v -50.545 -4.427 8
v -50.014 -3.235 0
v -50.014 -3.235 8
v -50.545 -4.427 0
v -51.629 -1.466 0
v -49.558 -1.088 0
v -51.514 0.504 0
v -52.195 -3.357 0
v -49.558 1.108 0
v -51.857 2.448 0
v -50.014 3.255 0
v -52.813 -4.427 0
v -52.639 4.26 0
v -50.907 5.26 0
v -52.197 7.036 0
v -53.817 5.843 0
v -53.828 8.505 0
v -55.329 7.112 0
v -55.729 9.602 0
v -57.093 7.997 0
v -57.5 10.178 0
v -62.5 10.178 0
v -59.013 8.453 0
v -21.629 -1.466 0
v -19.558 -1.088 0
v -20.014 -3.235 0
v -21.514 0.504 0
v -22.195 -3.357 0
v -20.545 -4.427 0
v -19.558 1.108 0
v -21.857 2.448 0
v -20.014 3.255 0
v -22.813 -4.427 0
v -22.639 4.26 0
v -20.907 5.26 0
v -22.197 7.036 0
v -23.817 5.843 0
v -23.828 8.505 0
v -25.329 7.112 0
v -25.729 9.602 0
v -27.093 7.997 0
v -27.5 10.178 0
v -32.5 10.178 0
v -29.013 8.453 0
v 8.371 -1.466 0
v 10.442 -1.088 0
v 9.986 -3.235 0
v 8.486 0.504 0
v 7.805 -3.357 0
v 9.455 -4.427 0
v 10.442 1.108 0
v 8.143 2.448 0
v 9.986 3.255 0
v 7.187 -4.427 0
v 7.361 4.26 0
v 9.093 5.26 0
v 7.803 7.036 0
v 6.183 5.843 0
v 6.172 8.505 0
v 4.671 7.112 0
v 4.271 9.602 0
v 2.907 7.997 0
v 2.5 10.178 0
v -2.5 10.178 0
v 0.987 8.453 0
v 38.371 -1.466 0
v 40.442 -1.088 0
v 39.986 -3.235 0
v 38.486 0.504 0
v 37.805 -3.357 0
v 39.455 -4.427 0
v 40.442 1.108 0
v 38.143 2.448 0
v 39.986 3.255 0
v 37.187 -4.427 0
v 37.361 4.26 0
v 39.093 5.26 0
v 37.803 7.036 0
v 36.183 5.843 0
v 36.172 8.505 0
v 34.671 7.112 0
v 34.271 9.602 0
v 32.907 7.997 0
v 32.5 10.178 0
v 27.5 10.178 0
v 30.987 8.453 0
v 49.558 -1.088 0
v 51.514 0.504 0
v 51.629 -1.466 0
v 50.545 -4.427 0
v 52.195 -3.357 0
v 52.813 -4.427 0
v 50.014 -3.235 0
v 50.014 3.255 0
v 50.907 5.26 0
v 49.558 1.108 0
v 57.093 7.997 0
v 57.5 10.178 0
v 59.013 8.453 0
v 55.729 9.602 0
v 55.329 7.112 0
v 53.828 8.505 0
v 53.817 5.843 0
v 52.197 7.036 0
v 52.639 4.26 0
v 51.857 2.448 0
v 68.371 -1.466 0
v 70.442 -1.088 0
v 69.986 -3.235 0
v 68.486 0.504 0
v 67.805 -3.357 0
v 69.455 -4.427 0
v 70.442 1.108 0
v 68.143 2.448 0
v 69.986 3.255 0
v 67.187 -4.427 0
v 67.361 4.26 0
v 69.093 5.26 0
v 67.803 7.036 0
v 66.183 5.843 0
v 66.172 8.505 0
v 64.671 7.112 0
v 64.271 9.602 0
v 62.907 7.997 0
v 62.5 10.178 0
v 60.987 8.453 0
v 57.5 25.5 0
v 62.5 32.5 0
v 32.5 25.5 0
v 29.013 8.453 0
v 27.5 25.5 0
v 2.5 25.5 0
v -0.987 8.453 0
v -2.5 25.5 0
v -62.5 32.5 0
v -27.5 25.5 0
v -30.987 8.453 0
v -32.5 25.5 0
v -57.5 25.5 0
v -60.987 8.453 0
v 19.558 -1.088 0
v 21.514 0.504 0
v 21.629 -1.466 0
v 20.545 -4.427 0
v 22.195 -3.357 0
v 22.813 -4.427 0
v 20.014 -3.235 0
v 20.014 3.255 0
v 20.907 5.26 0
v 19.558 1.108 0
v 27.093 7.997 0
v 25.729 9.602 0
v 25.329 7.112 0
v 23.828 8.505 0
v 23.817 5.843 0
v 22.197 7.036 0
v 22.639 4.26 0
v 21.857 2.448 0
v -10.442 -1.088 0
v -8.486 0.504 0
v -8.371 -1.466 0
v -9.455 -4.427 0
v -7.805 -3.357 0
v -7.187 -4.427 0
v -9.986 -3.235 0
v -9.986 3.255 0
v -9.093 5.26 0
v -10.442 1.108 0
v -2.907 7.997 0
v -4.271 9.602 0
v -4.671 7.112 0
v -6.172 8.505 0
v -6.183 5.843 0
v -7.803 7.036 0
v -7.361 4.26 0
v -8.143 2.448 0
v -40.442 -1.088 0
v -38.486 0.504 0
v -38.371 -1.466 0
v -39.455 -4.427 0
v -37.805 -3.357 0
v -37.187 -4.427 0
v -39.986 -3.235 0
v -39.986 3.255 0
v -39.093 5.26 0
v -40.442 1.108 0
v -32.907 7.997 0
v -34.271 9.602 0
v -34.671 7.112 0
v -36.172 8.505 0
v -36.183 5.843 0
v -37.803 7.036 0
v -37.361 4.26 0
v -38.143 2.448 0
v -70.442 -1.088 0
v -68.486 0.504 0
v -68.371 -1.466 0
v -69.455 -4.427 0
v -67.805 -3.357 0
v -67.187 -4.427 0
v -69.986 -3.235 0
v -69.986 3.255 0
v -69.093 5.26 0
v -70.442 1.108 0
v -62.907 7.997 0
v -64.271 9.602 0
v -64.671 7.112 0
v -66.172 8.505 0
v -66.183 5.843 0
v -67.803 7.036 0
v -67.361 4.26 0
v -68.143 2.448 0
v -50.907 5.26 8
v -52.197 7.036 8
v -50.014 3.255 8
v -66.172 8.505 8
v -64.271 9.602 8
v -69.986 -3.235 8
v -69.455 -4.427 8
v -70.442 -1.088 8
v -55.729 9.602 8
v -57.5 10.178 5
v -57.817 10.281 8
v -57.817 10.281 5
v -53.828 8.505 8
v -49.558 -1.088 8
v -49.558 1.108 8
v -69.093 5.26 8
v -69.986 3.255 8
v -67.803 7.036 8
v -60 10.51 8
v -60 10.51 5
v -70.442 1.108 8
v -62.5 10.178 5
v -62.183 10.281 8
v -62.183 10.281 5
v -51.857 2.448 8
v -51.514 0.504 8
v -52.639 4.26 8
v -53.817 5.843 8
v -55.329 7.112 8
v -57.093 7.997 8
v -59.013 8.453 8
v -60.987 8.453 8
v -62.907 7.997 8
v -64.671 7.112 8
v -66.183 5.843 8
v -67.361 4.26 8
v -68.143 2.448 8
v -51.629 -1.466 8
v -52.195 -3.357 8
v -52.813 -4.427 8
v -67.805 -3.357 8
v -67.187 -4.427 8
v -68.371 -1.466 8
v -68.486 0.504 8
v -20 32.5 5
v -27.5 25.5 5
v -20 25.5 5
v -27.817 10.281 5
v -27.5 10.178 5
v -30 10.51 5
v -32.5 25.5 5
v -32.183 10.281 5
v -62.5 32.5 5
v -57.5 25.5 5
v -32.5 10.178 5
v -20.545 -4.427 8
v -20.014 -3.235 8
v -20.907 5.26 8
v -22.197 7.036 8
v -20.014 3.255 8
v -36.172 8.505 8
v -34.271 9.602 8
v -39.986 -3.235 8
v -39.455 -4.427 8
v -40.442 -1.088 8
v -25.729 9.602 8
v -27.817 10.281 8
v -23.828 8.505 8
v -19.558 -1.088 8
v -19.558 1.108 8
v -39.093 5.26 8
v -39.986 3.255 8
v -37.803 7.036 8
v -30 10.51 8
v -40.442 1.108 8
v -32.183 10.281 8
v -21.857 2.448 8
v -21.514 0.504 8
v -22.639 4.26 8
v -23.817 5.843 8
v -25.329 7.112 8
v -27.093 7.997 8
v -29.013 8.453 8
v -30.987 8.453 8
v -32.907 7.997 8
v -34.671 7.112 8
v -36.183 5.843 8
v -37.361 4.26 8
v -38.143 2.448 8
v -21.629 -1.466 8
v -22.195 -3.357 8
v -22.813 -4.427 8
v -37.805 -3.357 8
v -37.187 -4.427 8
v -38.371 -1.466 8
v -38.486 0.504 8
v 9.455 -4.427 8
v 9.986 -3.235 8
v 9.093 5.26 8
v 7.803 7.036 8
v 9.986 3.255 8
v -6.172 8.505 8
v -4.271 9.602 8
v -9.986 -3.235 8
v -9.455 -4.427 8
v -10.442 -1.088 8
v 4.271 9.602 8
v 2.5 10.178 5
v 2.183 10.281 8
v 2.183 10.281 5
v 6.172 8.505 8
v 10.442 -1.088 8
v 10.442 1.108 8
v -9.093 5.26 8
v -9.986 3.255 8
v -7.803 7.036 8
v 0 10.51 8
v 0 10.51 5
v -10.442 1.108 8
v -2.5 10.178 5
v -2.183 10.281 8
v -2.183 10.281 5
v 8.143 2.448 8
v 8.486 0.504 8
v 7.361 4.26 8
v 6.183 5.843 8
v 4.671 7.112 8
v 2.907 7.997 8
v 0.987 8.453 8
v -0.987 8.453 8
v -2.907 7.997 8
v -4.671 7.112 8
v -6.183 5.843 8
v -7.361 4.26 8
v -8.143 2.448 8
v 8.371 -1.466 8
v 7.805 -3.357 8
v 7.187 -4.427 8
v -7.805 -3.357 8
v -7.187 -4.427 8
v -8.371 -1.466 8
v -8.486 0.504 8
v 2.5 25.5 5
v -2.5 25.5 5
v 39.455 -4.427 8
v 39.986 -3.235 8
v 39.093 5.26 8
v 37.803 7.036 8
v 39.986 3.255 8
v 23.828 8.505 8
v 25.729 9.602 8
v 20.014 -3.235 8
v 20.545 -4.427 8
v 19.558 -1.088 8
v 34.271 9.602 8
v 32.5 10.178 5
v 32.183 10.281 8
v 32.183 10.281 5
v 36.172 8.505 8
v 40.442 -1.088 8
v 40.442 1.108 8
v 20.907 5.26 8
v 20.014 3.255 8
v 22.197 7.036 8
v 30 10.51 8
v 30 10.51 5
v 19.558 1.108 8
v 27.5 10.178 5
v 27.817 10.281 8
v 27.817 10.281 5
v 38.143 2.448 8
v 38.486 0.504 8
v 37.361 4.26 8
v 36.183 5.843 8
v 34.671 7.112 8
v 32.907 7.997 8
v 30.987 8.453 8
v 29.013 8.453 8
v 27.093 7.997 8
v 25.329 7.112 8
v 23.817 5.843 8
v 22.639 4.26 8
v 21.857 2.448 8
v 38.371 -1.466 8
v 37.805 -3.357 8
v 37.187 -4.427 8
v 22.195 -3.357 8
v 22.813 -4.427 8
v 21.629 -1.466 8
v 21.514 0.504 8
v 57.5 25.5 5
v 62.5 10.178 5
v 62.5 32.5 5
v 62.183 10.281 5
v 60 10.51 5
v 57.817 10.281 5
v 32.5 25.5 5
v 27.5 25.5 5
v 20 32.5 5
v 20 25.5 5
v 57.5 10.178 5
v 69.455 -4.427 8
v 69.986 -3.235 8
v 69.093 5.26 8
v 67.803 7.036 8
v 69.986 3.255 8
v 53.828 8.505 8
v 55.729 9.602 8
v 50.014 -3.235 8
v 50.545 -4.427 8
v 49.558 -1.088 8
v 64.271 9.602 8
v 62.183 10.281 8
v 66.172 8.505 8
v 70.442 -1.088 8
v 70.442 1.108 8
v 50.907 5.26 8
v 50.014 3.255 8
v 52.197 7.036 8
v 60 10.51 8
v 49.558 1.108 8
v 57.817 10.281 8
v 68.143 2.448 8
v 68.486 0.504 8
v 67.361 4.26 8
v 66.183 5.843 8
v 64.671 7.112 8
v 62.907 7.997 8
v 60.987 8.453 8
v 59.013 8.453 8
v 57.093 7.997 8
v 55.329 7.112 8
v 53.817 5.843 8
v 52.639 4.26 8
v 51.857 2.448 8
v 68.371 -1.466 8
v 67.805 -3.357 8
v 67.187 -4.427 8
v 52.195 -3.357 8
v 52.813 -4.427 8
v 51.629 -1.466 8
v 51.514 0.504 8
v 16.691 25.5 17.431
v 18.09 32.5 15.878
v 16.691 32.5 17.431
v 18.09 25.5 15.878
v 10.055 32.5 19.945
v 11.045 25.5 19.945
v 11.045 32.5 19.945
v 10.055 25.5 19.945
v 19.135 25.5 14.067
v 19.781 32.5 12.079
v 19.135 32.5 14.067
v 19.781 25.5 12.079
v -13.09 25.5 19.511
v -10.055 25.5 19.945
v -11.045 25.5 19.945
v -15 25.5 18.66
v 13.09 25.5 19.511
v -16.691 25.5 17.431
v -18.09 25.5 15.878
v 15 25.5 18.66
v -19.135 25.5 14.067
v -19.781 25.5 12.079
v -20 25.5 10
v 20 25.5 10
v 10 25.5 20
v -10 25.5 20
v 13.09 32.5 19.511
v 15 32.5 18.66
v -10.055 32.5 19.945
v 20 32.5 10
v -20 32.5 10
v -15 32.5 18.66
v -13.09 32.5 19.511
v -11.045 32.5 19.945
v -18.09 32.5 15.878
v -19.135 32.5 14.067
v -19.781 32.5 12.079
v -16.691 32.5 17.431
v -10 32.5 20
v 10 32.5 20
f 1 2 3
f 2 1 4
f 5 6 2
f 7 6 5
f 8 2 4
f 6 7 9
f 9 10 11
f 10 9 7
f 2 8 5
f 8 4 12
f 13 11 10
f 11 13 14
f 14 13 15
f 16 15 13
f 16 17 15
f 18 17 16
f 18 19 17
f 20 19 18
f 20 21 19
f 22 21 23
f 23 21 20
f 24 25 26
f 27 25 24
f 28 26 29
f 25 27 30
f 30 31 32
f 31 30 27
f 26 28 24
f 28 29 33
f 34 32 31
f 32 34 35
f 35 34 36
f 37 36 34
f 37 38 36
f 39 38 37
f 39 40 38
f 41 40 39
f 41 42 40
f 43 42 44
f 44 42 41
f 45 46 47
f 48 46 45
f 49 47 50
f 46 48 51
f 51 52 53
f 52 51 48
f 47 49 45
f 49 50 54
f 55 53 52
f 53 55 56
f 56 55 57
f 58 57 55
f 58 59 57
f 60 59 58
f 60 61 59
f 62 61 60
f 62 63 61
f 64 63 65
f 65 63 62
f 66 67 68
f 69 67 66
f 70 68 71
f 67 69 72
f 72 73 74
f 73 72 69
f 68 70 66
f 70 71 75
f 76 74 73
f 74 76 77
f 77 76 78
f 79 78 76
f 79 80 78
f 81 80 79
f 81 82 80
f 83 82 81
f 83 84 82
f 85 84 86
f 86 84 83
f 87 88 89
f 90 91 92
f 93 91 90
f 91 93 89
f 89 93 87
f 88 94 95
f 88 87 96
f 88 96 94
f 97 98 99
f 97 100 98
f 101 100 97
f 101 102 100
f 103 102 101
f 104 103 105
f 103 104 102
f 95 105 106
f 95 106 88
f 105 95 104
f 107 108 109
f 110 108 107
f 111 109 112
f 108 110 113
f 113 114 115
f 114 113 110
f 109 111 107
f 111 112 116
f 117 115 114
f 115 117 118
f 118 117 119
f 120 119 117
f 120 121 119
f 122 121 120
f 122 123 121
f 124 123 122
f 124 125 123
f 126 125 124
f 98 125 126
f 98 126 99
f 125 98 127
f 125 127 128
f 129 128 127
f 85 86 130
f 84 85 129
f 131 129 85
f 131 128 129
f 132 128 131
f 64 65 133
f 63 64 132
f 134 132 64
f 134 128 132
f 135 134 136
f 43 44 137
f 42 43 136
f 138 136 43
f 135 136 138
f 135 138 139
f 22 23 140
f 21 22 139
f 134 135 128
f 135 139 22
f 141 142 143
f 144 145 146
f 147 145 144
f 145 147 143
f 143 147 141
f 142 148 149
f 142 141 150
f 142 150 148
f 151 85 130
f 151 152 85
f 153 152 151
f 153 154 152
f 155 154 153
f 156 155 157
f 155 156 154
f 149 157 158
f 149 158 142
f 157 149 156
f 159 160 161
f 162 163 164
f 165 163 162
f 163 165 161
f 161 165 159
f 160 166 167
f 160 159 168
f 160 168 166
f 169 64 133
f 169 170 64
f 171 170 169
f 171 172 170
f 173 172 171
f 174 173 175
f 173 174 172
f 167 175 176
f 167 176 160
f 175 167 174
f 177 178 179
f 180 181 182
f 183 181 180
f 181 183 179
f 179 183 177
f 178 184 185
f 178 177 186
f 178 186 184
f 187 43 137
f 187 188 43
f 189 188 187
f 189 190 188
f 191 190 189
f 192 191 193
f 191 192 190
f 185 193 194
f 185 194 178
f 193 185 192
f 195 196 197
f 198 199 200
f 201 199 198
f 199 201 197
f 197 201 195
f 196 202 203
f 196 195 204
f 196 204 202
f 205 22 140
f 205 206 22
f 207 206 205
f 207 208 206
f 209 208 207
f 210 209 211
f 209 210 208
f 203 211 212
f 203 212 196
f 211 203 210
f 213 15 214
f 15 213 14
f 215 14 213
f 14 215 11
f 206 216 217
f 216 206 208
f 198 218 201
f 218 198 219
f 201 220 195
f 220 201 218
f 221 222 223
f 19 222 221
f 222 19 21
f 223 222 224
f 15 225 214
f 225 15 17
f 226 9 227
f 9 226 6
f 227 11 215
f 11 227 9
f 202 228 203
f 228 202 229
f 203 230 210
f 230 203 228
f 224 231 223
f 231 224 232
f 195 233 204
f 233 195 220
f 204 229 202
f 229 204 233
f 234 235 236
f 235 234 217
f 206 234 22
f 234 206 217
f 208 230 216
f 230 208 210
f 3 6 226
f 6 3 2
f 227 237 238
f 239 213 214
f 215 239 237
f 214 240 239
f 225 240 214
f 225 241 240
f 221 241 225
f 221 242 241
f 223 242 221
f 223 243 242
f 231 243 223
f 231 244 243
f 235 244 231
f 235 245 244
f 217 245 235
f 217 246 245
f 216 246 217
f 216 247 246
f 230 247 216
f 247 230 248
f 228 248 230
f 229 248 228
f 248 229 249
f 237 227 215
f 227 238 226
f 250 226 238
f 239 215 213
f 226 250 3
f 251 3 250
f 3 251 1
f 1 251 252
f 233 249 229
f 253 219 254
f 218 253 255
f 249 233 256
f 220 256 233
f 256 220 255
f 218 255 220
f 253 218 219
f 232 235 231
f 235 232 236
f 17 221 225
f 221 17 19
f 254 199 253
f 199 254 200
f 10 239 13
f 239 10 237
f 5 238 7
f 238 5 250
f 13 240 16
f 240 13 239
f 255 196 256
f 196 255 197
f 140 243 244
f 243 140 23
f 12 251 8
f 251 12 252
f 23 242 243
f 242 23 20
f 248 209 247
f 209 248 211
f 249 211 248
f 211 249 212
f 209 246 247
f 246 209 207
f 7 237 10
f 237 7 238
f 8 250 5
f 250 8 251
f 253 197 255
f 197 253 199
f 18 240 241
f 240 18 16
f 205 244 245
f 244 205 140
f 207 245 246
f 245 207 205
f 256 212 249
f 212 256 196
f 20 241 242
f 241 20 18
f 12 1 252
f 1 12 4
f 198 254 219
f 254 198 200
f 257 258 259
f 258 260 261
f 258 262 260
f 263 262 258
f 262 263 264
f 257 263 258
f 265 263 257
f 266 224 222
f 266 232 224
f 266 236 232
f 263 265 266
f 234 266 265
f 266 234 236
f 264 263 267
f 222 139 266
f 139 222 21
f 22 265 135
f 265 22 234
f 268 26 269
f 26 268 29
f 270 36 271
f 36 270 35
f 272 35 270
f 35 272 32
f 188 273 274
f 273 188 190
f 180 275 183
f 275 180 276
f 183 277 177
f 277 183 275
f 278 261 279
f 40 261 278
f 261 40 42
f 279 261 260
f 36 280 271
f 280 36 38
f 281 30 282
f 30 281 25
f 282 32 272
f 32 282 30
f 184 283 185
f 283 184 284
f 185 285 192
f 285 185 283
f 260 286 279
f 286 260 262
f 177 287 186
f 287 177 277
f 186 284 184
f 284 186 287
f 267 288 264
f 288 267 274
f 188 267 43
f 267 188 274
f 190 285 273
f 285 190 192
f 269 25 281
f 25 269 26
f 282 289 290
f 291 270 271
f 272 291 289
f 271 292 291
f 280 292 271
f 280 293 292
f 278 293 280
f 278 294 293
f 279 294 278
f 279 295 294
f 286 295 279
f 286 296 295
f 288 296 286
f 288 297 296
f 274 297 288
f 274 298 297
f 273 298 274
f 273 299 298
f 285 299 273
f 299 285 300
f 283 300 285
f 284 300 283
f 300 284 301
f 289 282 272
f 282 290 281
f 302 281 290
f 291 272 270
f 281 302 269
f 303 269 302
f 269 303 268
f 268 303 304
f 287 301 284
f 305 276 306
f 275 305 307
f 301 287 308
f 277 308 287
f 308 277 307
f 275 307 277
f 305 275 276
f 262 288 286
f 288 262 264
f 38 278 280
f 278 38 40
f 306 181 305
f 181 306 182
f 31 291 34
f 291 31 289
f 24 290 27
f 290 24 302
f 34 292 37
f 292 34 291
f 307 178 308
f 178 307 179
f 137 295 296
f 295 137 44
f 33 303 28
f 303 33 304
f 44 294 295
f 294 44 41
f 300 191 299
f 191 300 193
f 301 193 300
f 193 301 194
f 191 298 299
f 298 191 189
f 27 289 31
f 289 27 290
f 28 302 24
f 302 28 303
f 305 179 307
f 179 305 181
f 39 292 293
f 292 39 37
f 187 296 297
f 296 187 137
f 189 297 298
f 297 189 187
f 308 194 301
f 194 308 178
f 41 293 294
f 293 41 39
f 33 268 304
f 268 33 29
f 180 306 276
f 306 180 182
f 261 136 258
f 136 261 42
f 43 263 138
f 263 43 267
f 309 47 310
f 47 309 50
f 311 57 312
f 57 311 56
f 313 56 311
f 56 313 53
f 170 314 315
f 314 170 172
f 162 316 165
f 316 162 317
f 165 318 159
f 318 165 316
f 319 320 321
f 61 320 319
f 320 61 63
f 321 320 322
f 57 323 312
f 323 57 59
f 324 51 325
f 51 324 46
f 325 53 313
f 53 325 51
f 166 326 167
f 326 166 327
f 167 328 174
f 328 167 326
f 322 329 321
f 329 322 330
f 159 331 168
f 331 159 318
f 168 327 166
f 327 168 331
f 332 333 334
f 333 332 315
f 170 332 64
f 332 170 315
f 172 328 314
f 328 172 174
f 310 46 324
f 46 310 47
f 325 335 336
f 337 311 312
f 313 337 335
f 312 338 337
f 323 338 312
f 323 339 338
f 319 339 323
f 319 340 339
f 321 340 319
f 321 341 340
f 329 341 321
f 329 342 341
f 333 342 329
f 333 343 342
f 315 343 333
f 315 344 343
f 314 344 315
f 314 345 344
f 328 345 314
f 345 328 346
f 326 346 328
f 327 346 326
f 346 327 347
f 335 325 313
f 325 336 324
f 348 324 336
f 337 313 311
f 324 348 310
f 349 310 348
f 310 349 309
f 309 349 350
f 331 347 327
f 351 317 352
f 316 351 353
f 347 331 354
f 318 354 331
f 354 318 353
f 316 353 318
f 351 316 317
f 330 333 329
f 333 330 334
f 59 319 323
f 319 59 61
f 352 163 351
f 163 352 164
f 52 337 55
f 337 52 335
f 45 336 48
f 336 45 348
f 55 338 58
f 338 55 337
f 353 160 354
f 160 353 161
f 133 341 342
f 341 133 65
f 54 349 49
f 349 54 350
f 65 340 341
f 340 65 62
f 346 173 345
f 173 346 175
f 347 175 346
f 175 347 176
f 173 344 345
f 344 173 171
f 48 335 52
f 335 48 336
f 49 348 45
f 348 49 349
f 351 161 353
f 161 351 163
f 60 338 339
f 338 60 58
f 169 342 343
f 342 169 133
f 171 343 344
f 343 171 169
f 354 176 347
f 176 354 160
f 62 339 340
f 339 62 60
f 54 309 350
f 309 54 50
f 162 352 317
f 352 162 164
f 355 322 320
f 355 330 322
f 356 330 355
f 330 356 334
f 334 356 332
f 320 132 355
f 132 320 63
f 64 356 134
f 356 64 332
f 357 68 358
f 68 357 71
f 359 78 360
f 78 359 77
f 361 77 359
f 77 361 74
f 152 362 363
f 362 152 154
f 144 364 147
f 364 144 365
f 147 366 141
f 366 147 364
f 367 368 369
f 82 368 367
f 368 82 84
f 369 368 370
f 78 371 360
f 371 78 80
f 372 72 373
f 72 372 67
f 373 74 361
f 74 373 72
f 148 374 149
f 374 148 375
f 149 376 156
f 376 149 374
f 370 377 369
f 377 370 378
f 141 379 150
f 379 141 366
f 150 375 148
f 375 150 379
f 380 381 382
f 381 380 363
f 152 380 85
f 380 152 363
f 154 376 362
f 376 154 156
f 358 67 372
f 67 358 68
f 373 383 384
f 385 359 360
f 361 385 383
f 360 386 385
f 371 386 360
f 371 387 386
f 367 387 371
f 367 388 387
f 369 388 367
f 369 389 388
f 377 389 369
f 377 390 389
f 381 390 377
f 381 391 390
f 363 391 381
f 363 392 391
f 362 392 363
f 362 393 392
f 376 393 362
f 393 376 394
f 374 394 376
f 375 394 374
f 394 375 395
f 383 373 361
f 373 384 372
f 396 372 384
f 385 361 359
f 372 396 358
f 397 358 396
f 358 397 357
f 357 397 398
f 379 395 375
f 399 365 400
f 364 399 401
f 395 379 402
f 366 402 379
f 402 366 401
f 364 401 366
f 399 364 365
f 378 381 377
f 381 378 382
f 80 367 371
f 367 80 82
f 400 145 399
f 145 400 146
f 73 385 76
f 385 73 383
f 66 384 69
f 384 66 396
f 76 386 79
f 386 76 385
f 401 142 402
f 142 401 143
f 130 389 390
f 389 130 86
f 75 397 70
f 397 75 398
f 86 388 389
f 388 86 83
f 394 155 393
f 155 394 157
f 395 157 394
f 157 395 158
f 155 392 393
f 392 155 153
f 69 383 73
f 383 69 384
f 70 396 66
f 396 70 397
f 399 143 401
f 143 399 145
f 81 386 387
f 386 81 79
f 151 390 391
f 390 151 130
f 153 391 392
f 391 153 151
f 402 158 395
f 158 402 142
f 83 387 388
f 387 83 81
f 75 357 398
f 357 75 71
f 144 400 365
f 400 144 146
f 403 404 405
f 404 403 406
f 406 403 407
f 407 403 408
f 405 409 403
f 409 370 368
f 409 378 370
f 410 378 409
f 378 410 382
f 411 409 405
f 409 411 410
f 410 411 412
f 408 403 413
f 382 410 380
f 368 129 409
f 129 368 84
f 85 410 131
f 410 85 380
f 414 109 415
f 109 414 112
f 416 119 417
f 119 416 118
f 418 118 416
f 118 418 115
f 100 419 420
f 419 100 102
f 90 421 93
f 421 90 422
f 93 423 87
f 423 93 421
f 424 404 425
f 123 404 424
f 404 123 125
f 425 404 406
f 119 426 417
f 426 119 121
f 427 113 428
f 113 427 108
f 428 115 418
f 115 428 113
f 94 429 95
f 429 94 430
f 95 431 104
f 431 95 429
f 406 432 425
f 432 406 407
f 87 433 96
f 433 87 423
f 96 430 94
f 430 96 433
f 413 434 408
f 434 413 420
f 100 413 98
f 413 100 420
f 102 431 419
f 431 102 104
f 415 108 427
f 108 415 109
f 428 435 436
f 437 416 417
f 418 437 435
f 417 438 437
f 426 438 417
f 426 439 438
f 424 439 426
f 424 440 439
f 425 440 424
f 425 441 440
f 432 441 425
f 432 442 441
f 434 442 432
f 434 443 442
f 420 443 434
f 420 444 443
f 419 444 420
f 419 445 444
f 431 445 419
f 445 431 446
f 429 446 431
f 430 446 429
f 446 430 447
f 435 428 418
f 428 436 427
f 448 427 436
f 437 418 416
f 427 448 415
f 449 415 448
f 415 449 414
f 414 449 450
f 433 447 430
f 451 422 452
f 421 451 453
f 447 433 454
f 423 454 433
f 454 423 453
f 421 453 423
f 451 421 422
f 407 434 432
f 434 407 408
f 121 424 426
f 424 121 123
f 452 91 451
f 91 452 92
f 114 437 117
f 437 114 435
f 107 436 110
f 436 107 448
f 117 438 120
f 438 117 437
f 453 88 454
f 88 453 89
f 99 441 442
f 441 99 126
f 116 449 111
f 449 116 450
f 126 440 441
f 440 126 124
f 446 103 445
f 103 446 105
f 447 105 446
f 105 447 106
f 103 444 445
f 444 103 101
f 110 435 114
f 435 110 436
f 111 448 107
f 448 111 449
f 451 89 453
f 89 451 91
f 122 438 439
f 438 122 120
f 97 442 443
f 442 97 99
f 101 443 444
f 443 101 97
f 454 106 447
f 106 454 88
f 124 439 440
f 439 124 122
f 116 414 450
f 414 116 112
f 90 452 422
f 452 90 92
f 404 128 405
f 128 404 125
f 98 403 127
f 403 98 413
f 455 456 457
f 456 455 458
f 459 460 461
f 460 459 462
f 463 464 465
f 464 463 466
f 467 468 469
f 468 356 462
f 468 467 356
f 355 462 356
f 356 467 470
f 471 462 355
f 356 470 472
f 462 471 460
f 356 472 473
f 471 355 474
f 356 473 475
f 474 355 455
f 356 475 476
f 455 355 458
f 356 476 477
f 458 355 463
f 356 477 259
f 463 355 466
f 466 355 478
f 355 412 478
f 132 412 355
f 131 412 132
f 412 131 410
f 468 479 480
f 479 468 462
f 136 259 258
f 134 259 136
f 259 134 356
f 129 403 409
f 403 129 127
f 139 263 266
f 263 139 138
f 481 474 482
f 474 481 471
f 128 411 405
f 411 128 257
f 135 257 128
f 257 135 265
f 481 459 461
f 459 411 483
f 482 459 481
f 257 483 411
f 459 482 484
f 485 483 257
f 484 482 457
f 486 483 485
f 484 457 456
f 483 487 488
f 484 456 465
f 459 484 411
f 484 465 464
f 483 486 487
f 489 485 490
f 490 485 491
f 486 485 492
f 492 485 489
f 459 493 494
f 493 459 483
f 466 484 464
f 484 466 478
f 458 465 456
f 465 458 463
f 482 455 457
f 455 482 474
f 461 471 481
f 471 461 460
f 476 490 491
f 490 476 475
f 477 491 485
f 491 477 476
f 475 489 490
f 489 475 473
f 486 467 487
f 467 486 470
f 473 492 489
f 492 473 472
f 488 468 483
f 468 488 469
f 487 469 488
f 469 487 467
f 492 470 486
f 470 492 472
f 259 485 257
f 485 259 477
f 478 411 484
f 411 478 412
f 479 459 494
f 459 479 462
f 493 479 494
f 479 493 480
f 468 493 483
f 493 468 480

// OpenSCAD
// [FL_INDEX: keywords="openscad, 3d_parametric, Parallel_Line_Drawing_Tool__Parametric, csg_solid" | COT="Parametric OpenSCAD design from 3DCodeverse"]
// Title: Parallel Line Drawing Tool (Parametric)

/*
 * Parallel Line Jig
 *
 * by Alex Franke (CodeCreations), Oct 2012
 * http://www.theFrankes.com
 * 
 * Licenced under Creative Commons Attribution - Non-Commercial - Share Alike 3.0 
 * 
 * INSTRUCTIONS: Choose some values in the "User-defined values" section, render, and print.
 *   It works well to hold the jig between your thumb and index finger as you pull it across 
 *   the drawing surface.  
 * 
 * THING: http://www.thingiverse.com/thing:31061
 * 
 * v1.00, Oct 3, 2012: Initial release. 
 *
 * TODO: 
 *   * Include keyholes for hanging 
 */

/////////////////////////////////////////////////////////////////////////////
// User-defined values... 
/////////////////////////////////////////////////////////////////////////////
numberOfLines   = 5;    // Total number of pen holders
distanceApart   = 30;   // The distance between parallel lines

penDiameter     = 17;   // The diameter of the writing implement
clampHeight     = 8;    // The height of the writing implement grips  
clampThickness  = 2;    // The thickness of the material that grips the writing implement
gripLength      = 2.5;  // The distance the grips wrap around the writing implements

frameThickness  = 5;    // The thickness of the bars that attach the grips to the handle
frameLength     = 15;   // The distance the grips extend from the handle

handleHeight    = 20;   // The height of the handle
handleThickness = 7;    // The thickness of the handle
handleLength    = 40;   // The length of the handle
handleRadius    = 10;   // The radius of the curve on the upper corners of the handle

rotation        = 0;    // The amount the entire piece will be rotated on the print bed. 


/////////////////////////////////////////////////////////////////////////////
// The code... 
/////////////////////////////////////////////////////////////////////////////

rotate([0,0,-90+rotation]) 
union() {

	clamps(); 
	
	translate([-penDiameter/2-clampThickness-frameLength,0,0]) 
		rotate([90,0,-90]) 
			handle(); 
}

module handle() {
	union() {
		translate([-handleLength/2,0,0]) 
			linear_extrude(height=handleThickness)
				polygon(points=[
					[0,0],
					[0,handleHeight-handleRadius],
					[handleRadius,handleHeight],
					[handleLength-handleRadius,handleHeight],
					[handleLength,handleHeight-handleRadius],
					[handleLength,0]
					]);

		for( i=[-1,1] ) {
			translate([(handleLength/2 - handleRadius)*i,handleHeight-handleRadius,0]) 
				difference() {
					cylinder(h=handleThickness, r=handleRadius);
					translate([0,-handleRadius/2,handleThickness/2]) 
						cube([handleRadius*2,handleRadius,handleThickness+1], center=true);
				}
		}

		translate([0,frameThickness/2,handleThickness/2]) 
		cube([distanceApart*(numberOfLines-1)+frameThickness,frameThickness,handleThickness], center=true);
	}
}

module clamps() {
	translate([-0.01, -((numberOfLines-1)*distanceApart)/2,0]) 
	for( i=[0:numberOfLines-1] ) {
		translate([0,distanceApart*i,0]) {
			union() {
				translate([0,0,clampHeight/2]) 
					rodClamp(penDiameter, clampThickness, clampHeight, penDiameter-gripLength);
				translate([-(frameLength+clampThickness+penDiameter)/2,0,frameThickness/2]) 
					cube([frameLength+clampThickness, frameThickness, frameThickness], center=true);
			}
		}
	}
}

// Taken from my SnapConnectors project
module rodClamp(rodDiameter=8, thickness=2, length=8, opening=6) {
	dist = sqrt( pow(rodDiameter/2,2) - pow(opening/2,2) );
	difference() {
		cylinder(h=length, r=rodDiameter/2 + thickness, center=true);
		cylinder(h=length+1, r=rodDiameter/2, center=true);
		translate([dist + (rodDiameter/2 + thickness +1)/2,0,0]) 
			cube([rodDiameter/2 + thickness +1,rodDiameter + thickness*2 +1,length+1], center=true);
	}
}
